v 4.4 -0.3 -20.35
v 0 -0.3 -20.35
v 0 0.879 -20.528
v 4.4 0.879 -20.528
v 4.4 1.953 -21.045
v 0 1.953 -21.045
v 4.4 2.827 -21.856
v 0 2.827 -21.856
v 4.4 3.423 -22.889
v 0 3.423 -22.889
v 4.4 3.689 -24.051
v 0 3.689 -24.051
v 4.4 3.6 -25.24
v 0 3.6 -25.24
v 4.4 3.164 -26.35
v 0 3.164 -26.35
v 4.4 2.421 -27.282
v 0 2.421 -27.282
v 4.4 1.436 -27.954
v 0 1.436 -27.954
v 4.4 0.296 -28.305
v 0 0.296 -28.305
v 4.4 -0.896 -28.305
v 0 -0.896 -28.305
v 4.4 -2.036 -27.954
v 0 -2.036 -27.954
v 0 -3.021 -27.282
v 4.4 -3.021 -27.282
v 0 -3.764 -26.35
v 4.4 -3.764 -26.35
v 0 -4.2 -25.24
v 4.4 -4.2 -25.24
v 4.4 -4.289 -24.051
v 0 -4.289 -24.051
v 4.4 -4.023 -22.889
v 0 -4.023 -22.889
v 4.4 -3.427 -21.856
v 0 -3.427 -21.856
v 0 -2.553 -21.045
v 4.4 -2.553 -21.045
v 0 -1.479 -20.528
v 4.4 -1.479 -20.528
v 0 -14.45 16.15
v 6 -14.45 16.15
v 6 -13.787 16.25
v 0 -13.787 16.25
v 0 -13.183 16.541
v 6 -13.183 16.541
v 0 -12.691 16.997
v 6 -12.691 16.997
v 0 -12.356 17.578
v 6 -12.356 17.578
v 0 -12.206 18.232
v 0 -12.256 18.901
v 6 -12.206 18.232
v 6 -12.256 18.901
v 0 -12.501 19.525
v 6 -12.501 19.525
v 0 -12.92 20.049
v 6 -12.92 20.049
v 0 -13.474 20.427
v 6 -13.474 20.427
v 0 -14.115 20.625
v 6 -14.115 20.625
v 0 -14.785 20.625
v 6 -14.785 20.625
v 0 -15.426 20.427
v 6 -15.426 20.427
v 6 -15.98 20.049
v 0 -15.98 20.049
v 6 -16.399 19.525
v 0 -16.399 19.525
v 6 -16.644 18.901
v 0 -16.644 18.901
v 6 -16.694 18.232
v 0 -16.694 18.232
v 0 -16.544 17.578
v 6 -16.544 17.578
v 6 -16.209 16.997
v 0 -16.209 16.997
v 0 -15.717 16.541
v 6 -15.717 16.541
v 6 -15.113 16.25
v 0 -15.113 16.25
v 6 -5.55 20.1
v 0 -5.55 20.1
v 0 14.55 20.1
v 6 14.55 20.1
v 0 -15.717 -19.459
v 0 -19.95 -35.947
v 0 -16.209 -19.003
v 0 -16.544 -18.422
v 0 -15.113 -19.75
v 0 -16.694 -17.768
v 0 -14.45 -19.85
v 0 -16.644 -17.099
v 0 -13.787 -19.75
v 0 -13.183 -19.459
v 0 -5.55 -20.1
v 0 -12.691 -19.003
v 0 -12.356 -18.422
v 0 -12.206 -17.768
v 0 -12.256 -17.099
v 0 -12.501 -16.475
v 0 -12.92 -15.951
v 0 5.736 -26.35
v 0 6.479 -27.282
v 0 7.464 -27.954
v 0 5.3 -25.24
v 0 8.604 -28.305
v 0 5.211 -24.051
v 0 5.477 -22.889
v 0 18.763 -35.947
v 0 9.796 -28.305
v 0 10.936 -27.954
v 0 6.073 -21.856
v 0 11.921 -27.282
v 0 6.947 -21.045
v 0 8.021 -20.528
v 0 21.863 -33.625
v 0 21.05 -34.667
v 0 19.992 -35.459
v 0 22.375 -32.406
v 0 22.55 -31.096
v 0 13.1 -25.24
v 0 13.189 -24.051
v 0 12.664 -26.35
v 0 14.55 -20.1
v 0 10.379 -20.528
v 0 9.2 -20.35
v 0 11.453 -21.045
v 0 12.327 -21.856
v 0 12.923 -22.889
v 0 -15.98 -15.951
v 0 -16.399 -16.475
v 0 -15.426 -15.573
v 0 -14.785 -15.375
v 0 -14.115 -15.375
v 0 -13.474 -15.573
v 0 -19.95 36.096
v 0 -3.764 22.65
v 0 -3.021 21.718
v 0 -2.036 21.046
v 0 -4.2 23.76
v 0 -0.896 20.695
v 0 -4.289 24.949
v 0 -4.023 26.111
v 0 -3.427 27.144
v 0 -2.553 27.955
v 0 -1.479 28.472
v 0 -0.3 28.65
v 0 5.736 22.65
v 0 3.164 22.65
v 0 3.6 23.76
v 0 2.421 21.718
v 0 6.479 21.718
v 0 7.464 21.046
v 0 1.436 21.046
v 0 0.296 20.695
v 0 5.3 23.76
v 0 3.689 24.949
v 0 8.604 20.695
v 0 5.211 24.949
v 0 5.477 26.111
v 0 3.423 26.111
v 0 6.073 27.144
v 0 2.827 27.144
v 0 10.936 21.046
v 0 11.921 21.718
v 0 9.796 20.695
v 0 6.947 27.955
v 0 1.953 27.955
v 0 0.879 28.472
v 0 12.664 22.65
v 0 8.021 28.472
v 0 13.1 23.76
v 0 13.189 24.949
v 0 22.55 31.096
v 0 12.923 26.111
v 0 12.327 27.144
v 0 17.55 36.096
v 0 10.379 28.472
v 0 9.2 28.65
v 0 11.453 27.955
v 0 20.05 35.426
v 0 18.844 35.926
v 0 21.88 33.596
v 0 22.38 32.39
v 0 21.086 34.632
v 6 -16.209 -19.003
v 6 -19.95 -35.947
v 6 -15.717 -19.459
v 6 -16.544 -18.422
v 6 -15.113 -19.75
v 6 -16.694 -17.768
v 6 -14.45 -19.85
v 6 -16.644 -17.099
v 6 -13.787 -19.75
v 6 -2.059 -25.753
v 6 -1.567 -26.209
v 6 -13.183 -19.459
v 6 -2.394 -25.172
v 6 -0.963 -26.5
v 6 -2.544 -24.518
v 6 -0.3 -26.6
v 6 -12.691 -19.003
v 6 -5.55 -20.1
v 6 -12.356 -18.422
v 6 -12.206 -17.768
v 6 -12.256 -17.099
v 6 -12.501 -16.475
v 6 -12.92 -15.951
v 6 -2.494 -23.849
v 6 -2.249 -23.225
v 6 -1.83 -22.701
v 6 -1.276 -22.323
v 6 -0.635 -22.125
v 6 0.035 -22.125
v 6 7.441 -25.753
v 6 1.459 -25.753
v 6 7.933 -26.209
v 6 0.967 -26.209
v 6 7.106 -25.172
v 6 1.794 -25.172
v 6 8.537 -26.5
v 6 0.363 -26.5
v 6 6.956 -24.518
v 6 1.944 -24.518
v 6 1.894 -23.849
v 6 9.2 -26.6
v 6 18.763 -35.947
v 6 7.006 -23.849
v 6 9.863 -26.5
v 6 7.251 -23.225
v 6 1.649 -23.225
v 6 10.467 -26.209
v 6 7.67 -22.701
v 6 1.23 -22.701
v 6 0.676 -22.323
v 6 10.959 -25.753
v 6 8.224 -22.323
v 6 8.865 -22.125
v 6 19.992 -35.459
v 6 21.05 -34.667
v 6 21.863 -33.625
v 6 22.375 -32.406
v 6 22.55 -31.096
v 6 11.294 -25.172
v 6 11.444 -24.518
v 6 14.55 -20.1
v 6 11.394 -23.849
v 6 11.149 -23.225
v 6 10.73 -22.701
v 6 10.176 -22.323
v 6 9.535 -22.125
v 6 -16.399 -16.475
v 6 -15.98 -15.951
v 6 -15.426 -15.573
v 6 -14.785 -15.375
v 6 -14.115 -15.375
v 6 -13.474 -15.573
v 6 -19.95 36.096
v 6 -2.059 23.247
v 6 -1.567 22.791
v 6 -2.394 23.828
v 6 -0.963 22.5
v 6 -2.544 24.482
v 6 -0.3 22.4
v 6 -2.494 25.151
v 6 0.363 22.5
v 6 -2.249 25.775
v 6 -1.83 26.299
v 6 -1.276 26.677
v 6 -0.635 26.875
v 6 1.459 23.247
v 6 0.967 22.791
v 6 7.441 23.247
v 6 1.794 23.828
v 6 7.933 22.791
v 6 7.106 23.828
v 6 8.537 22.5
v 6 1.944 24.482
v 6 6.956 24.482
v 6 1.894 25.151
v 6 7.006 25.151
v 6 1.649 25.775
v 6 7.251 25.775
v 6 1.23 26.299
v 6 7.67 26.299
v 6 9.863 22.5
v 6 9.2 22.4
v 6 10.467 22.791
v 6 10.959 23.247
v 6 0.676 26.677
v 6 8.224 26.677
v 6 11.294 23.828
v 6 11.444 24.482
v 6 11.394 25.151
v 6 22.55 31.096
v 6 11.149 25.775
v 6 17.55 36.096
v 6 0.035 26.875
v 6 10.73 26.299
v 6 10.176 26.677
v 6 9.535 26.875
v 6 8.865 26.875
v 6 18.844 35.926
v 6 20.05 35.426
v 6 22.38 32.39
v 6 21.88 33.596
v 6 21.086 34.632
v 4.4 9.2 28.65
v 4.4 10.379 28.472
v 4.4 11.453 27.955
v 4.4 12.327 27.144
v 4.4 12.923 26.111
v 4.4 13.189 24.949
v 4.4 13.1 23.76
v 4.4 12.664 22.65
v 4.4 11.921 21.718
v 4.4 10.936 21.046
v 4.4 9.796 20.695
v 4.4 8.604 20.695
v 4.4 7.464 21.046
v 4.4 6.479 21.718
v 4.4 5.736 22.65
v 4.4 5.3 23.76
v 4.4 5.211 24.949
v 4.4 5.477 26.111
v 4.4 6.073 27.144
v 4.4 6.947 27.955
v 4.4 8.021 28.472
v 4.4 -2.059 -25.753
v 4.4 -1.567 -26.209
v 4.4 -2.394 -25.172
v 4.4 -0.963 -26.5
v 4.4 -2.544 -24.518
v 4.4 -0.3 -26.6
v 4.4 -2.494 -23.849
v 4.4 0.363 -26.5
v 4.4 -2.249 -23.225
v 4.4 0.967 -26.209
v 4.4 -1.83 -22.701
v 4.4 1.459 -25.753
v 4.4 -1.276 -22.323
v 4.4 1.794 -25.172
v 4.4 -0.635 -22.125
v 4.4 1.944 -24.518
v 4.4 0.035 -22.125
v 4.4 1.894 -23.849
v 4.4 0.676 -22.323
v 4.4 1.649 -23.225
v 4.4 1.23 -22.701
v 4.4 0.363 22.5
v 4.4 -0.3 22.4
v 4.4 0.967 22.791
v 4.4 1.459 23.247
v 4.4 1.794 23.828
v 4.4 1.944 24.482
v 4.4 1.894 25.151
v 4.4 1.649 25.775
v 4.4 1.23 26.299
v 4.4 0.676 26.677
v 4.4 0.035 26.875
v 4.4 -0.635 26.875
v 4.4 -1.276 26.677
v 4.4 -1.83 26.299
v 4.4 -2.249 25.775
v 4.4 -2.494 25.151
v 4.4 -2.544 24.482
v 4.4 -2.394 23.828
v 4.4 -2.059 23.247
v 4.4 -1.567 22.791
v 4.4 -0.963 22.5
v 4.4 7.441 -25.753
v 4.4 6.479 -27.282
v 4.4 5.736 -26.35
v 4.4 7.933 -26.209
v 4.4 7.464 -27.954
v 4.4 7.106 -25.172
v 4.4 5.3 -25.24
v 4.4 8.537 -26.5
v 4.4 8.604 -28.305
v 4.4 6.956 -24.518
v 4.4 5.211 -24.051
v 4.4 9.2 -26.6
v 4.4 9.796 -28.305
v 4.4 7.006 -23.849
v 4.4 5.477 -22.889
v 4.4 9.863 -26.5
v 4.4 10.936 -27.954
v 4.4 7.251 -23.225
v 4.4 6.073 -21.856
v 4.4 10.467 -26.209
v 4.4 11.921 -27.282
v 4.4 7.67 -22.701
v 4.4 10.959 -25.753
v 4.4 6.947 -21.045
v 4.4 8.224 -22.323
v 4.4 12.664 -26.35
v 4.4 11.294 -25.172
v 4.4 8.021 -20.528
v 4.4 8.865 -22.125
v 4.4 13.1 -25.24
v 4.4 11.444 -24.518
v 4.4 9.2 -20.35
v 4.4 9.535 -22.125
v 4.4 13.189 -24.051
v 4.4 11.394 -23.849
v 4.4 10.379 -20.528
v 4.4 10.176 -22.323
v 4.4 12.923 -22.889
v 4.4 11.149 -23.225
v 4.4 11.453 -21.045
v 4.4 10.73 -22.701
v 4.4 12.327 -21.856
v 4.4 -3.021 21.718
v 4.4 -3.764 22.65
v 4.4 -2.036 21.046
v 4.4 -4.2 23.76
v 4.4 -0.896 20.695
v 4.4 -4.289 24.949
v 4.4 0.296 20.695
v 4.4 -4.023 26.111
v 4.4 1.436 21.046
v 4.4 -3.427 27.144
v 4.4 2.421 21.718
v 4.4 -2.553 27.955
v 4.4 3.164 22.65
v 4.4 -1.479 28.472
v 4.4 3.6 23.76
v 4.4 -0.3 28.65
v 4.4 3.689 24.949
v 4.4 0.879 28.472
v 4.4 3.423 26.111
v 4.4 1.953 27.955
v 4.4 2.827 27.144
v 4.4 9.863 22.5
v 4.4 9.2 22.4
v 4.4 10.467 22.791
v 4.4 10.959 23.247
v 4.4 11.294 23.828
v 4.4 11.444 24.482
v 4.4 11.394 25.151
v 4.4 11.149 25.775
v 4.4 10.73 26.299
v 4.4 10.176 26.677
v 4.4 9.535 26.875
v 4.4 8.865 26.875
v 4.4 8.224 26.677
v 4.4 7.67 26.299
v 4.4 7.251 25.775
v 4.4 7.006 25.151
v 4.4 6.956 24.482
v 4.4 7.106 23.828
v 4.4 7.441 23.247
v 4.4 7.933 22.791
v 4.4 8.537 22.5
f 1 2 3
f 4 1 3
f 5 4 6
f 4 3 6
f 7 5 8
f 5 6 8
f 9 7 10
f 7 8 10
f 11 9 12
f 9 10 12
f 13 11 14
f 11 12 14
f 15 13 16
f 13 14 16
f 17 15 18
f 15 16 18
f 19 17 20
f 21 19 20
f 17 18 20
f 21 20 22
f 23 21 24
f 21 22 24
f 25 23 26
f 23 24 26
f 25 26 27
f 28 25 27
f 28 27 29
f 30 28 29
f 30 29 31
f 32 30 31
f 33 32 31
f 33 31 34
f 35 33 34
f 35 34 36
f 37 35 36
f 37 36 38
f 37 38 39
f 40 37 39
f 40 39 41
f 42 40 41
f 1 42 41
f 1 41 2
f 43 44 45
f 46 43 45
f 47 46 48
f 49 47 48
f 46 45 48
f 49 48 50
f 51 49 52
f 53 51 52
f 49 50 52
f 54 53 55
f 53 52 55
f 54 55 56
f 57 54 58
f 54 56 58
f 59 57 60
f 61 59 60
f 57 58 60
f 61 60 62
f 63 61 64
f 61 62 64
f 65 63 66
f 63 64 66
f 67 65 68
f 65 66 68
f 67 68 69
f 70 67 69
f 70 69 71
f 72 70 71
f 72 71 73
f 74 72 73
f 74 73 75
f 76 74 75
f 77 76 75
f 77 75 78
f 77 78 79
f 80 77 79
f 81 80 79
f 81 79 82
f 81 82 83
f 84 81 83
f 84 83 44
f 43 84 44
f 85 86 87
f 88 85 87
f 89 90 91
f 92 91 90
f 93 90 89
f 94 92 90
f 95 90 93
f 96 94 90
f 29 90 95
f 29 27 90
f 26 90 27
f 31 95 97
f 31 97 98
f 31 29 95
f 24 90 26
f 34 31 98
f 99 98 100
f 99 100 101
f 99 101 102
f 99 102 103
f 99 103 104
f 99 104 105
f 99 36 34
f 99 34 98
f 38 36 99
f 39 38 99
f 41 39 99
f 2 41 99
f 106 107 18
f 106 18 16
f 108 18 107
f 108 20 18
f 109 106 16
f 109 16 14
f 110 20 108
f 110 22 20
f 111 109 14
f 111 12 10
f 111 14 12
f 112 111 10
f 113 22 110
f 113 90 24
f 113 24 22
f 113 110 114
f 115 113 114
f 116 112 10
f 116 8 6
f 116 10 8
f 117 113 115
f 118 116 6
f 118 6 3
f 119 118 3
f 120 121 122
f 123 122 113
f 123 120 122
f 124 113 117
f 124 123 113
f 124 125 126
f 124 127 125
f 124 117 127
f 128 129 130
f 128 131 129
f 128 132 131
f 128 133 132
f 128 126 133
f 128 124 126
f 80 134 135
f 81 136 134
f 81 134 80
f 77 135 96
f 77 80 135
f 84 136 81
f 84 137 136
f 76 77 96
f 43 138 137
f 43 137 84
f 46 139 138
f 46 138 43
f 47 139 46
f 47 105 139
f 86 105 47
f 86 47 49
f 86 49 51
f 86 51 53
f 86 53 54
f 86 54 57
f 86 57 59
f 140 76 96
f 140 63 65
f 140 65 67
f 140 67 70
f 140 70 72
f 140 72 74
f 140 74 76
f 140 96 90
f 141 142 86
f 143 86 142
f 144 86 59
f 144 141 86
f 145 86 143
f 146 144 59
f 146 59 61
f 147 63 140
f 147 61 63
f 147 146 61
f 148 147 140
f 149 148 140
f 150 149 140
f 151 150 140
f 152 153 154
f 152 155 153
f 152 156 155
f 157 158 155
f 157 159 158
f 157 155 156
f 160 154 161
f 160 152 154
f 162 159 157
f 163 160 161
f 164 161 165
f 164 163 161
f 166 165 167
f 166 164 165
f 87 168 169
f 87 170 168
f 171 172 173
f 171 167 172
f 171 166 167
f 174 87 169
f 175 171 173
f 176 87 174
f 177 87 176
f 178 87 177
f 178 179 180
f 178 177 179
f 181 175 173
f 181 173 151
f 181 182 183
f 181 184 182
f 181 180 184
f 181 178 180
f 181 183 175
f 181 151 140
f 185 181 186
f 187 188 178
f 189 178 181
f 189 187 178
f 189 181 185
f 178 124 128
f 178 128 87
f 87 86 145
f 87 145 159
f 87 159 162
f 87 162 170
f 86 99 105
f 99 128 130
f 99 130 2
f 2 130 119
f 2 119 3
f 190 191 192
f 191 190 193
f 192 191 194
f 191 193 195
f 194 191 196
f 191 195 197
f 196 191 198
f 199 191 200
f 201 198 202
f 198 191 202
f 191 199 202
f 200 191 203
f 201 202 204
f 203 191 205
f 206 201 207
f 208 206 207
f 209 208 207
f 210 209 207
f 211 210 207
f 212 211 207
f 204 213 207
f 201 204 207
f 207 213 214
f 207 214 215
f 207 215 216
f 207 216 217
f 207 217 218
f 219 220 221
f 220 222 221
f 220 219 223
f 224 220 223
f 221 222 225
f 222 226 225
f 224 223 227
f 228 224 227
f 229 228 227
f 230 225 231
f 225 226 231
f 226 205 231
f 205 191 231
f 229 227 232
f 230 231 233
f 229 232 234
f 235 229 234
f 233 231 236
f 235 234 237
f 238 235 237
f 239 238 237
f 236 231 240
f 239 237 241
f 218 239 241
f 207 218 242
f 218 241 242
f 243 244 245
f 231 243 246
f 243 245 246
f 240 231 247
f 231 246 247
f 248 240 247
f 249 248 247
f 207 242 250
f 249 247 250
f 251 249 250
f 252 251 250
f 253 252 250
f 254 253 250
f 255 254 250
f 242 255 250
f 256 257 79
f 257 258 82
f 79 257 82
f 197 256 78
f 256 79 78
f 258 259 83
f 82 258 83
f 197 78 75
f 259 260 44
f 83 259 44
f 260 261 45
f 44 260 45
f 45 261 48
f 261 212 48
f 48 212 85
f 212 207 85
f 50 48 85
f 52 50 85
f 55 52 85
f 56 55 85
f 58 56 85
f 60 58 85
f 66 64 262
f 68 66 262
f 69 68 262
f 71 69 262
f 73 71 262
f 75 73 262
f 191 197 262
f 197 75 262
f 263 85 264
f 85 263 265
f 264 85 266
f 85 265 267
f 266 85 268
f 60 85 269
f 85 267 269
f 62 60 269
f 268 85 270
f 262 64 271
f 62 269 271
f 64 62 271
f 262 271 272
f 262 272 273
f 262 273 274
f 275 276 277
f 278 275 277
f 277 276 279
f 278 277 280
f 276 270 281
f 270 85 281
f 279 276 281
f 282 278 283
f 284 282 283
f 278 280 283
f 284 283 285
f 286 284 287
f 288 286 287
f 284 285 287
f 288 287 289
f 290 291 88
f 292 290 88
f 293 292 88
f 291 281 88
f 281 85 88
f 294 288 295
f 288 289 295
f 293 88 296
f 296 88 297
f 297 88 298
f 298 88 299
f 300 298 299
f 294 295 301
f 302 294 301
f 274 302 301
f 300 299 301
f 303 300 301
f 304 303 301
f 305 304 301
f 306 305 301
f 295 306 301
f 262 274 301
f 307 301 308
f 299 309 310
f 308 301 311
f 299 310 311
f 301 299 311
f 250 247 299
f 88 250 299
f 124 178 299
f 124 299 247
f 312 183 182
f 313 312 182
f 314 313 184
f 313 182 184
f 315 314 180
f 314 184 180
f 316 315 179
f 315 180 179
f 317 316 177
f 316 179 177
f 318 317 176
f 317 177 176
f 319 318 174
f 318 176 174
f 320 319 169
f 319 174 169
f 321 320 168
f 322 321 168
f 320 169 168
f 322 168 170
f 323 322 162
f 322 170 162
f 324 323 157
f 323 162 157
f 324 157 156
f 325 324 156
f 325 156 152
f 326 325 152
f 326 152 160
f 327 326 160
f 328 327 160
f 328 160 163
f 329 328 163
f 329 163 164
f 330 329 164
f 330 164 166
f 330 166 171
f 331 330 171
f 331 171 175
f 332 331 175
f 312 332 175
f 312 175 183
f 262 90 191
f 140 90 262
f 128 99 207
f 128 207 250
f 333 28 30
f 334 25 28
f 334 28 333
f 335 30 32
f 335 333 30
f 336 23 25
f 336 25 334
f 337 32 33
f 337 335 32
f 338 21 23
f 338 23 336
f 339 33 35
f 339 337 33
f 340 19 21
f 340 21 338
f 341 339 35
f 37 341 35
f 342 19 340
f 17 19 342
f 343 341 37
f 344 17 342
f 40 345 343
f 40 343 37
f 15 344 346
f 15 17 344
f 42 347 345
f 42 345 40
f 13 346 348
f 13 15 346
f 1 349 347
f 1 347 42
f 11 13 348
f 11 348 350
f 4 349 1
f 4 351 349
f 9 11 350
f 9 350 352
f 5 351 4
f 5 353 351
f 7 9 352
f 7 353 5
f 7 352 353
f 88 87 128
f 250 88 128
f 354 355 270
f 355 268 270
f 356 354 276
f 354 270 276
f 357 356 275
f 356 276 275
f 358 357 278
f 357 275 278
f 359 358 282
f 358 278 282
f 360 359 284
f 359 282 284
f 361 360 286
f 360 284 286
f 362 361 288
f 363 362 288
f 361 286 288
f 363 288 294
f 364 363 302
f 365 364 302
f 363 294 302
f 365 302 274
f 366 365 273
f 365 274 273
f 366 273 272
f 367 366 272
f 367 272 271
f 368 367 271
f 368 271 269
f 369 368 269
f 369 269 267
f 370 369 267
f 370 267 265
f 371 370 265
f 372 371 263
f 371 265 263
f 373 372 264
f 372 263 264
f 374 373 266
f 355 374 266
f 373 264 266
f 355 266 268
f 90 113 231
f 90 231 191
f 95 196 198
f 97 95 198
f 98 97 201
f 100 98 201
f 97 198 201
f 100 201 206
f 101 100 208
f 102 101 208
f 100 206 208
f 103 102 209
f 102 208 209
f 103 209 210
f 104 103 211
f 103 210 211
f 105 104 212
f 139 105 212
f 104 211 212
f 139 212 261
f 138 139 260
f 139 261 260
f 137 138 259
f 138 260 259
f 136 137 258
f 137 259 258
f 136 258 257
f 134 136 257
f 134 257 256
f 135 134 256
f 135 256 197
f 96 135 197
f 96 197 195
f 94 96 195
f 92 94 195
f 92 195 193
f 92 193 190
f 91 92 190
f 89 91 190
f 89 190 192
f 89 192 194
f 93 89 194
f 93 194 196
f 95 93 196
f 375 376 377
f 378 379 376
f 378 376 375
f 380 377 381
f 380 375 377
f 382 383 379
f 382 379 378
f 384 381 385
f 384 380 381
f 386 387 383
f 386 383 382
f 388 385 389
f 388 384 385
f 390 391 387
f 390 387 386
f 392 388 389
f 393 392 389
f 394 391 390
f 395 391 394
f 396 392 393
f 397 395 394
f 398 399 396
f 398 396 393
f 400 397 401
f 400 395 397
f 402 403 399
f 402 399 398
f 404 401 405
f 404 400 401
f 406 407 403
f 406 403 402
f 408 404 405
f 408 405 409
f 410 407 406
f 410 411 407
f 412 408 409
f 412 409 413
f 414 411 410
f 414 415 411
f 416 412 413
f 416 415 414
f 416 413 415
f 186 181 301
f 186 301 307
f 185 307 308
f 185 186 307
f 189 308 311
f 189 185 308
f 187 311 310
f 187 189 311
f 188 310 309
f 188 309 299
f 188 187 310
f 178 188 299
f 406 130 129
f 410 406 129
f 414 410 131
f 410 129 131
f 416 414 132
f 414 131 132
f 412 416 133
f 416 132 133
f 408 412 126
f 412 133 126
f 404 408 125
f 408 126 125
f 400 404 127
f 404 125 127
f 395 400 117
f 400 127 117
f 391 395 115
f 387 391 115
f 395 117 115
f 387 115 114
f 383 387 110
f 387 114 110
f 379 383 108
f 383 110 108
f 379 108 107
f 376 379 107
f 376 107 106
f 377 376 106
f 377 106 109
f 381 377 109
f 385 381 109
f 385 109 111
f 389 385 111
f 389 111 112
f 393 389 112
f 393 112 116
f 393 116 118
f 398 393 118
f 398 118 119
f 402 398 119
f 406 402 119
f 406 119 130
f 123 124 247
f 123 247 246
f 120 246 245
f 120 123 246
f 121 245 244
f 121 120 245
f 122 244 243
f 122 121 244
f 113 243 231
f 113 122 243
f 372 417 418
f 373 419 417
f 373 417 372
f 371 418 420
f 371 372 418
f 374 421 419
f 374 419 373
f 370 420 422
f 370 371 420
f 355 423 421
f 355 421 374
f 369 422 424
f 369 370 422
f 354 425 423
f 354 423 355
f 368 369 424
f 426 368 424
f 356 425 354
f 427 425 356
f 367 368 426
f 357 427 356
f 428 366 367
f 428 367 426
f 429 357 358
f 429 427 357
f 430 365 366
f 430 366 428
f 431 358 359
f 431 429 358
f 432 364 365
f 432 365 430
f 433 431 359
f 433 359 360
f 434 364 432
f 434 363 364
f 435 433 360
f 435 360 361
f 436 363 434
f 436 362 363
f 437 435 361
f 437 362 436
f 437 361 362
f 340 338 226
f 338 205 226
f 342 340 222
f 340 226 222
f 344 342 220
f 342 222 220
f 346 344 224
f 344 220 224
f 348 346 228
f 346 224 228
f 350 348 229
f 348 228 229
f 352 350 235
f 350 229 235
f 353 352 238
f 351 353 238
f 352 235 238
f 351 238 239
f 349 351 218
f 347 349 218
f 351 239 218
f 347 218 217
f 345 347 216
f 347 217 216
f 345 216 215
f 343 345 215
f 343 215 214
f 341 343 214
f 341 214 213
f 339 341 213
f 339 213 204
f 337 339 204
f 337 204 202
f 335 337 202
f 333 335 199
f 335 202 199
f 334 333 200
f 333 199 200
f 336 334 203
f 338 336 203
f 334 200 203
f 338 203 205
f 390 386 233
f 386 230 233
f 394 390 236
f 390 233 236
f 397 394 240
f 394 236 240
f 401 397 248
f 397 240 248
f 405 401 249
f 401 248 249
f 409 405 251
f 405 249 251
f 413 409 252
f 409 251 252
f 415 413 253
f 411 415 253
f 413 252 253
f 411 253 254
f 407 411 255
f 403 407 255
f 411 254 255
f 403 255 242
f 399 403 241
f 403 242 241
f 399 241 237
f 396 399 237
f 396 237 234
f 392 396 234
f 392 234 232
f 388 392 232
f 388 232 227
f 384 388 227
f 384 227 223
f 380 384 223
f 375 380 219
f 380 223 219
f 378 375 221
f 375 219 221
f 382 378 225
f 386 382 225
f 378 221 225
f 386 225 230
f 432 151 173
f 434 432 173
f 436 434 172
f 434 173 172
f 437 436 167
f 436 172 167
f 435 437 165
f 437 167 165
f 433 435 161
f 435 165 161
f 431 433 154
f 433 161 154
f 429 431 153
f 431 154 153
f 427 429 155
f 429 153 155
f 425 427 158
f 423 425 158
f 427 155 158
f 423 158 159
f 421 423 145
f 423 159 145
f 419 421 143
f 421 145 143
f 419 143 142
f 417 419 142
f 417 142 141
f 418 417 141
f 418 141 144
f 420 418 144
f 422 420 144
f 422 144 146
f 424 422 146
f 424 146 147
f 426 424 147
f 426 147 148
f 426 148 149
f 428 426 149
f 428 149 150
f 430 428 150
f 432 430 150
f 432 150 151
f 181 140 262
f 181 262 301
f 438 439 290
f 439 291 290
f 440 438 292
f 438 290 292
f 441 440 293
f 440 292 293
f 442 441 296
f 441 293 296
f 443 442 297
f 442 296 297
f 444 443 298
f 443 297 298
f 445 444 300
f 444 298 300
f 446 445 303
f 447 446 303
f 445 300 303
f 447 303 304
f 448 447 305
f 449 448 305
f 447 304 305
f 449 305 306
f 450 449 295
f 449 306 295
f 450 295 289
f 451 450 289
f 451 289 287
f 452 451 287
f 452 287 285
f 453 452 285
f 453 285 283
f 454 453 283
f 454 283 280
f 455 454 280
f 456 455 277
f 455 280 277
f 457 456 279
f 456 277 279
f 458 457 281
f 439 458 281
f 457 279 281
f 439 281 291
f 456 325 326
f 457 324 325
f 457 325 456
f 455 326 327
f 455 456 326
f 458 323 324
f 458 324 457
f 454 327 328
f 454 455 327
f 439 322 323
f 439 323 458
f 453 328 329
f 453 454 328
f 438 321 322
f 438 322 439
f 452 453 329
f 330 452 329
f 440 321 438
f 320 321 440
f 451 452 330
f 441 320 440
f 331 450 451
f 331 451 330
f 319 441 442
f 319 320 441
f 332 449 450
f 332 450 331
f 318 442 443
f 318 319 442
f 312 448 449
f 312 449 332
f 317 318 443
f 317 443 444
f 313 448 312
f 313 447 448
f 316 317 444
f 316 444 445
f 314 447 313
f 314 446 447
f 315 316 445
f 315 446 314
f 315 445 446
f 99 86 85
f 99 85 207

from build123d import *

# Parameters (mm, degrees)
SKETCH1_W                                           = 40.2
SKETCH1_H                                           = 20.1
BOSS_EXTRUDE1_DEPTH                                 = 6
CBORE_FOR_M4_HEX_SOCKET_HEAD_CAP_SCREW1_D           = 4.5
CBORE_FOR_M4_HEX_SOCKET_HEAD_CAP_SCREW1_CBORE_D     = 8
CBORE_FOR_M4_HEX_SOCKET_HEAD_CAP_SCREW1_CBORE_DEPTH = 4.4
M4_CLEARANCE_HOLE1_D                                = 4.5


with BuildPart() as part:
    # Sketch1 → Boss-Extrude1 (new body)
    with BuildSketch(Plane(origin=(0, 0, 0), x_dir=(0, 0, -1), z_dir=(1, 0, 0))):
        with BuildLine():
            Line((-36.096117968, -19.95), (-36.096117968, 17.55))
            ThreePointArc((-36.096117968, 17.55), (-34.631651874, 21.085533906), (-31.096117968, 22.55))
            Line((-31.096117968, 22.55), (31.096117968, 22.55))
            ThreePointArc((31.096117968, 22.55), (34.173179015, 21.49102719), (35.946830469, 18.762678125))
            Line((35.946830469, 18.762678125), (35.946830469, -19.95))
            Line((35.946830469, -19.95), (-36.096117968, -19.95))
        make_face()
        with Locations((0, 4.5)):
            Rectangle(SKETCH1_W, SKETCH1_H, mode=Mode.SUBTRACT)
    extrude(amount=BOSS_EXTRUDE1_DEPTH)

    # CBORE for M4 Hex Socket Head Cap Screw1 (through all)
    with Locations(Plane(origin=(0, -170.712474926, -177.829982134), x_dir=(0, 0, 1), z_dir=(-1, 0, 0))):
        with Locations((202.479982134, 170.412474926), (202.479982134, 179.912474926), (153.479982134, 170.412474926), (153.479982134, 179.912474926)):
            CounterBoreHole(CBORE_FOR_M4_HEX_SOCKET_HEAD_CAP_SCREW1_D / 2, CBORE_FOR_M4_HEX_SOCKET_HEAD_CAP_SCREW1_CBORE_D / 2, CBORE_FOR_M4_HEX_SOCKET_HEAD_CAP_SCREW1_CBORE_DEPTH)

    # M4 Clearance Hole1 (through all)
    with Locations(Plane(origin=(0, -170.712474926, -177.829982134), x_dir=(0, 0, 1), z_dir=(-1, 0, 0))):
        with Locations((160.229982134, 156.262474926), (196.229982134, 156.262474926)):
            Hole(M4_CLEARANCE_HOLE1_D / 2)


solid = part.part
